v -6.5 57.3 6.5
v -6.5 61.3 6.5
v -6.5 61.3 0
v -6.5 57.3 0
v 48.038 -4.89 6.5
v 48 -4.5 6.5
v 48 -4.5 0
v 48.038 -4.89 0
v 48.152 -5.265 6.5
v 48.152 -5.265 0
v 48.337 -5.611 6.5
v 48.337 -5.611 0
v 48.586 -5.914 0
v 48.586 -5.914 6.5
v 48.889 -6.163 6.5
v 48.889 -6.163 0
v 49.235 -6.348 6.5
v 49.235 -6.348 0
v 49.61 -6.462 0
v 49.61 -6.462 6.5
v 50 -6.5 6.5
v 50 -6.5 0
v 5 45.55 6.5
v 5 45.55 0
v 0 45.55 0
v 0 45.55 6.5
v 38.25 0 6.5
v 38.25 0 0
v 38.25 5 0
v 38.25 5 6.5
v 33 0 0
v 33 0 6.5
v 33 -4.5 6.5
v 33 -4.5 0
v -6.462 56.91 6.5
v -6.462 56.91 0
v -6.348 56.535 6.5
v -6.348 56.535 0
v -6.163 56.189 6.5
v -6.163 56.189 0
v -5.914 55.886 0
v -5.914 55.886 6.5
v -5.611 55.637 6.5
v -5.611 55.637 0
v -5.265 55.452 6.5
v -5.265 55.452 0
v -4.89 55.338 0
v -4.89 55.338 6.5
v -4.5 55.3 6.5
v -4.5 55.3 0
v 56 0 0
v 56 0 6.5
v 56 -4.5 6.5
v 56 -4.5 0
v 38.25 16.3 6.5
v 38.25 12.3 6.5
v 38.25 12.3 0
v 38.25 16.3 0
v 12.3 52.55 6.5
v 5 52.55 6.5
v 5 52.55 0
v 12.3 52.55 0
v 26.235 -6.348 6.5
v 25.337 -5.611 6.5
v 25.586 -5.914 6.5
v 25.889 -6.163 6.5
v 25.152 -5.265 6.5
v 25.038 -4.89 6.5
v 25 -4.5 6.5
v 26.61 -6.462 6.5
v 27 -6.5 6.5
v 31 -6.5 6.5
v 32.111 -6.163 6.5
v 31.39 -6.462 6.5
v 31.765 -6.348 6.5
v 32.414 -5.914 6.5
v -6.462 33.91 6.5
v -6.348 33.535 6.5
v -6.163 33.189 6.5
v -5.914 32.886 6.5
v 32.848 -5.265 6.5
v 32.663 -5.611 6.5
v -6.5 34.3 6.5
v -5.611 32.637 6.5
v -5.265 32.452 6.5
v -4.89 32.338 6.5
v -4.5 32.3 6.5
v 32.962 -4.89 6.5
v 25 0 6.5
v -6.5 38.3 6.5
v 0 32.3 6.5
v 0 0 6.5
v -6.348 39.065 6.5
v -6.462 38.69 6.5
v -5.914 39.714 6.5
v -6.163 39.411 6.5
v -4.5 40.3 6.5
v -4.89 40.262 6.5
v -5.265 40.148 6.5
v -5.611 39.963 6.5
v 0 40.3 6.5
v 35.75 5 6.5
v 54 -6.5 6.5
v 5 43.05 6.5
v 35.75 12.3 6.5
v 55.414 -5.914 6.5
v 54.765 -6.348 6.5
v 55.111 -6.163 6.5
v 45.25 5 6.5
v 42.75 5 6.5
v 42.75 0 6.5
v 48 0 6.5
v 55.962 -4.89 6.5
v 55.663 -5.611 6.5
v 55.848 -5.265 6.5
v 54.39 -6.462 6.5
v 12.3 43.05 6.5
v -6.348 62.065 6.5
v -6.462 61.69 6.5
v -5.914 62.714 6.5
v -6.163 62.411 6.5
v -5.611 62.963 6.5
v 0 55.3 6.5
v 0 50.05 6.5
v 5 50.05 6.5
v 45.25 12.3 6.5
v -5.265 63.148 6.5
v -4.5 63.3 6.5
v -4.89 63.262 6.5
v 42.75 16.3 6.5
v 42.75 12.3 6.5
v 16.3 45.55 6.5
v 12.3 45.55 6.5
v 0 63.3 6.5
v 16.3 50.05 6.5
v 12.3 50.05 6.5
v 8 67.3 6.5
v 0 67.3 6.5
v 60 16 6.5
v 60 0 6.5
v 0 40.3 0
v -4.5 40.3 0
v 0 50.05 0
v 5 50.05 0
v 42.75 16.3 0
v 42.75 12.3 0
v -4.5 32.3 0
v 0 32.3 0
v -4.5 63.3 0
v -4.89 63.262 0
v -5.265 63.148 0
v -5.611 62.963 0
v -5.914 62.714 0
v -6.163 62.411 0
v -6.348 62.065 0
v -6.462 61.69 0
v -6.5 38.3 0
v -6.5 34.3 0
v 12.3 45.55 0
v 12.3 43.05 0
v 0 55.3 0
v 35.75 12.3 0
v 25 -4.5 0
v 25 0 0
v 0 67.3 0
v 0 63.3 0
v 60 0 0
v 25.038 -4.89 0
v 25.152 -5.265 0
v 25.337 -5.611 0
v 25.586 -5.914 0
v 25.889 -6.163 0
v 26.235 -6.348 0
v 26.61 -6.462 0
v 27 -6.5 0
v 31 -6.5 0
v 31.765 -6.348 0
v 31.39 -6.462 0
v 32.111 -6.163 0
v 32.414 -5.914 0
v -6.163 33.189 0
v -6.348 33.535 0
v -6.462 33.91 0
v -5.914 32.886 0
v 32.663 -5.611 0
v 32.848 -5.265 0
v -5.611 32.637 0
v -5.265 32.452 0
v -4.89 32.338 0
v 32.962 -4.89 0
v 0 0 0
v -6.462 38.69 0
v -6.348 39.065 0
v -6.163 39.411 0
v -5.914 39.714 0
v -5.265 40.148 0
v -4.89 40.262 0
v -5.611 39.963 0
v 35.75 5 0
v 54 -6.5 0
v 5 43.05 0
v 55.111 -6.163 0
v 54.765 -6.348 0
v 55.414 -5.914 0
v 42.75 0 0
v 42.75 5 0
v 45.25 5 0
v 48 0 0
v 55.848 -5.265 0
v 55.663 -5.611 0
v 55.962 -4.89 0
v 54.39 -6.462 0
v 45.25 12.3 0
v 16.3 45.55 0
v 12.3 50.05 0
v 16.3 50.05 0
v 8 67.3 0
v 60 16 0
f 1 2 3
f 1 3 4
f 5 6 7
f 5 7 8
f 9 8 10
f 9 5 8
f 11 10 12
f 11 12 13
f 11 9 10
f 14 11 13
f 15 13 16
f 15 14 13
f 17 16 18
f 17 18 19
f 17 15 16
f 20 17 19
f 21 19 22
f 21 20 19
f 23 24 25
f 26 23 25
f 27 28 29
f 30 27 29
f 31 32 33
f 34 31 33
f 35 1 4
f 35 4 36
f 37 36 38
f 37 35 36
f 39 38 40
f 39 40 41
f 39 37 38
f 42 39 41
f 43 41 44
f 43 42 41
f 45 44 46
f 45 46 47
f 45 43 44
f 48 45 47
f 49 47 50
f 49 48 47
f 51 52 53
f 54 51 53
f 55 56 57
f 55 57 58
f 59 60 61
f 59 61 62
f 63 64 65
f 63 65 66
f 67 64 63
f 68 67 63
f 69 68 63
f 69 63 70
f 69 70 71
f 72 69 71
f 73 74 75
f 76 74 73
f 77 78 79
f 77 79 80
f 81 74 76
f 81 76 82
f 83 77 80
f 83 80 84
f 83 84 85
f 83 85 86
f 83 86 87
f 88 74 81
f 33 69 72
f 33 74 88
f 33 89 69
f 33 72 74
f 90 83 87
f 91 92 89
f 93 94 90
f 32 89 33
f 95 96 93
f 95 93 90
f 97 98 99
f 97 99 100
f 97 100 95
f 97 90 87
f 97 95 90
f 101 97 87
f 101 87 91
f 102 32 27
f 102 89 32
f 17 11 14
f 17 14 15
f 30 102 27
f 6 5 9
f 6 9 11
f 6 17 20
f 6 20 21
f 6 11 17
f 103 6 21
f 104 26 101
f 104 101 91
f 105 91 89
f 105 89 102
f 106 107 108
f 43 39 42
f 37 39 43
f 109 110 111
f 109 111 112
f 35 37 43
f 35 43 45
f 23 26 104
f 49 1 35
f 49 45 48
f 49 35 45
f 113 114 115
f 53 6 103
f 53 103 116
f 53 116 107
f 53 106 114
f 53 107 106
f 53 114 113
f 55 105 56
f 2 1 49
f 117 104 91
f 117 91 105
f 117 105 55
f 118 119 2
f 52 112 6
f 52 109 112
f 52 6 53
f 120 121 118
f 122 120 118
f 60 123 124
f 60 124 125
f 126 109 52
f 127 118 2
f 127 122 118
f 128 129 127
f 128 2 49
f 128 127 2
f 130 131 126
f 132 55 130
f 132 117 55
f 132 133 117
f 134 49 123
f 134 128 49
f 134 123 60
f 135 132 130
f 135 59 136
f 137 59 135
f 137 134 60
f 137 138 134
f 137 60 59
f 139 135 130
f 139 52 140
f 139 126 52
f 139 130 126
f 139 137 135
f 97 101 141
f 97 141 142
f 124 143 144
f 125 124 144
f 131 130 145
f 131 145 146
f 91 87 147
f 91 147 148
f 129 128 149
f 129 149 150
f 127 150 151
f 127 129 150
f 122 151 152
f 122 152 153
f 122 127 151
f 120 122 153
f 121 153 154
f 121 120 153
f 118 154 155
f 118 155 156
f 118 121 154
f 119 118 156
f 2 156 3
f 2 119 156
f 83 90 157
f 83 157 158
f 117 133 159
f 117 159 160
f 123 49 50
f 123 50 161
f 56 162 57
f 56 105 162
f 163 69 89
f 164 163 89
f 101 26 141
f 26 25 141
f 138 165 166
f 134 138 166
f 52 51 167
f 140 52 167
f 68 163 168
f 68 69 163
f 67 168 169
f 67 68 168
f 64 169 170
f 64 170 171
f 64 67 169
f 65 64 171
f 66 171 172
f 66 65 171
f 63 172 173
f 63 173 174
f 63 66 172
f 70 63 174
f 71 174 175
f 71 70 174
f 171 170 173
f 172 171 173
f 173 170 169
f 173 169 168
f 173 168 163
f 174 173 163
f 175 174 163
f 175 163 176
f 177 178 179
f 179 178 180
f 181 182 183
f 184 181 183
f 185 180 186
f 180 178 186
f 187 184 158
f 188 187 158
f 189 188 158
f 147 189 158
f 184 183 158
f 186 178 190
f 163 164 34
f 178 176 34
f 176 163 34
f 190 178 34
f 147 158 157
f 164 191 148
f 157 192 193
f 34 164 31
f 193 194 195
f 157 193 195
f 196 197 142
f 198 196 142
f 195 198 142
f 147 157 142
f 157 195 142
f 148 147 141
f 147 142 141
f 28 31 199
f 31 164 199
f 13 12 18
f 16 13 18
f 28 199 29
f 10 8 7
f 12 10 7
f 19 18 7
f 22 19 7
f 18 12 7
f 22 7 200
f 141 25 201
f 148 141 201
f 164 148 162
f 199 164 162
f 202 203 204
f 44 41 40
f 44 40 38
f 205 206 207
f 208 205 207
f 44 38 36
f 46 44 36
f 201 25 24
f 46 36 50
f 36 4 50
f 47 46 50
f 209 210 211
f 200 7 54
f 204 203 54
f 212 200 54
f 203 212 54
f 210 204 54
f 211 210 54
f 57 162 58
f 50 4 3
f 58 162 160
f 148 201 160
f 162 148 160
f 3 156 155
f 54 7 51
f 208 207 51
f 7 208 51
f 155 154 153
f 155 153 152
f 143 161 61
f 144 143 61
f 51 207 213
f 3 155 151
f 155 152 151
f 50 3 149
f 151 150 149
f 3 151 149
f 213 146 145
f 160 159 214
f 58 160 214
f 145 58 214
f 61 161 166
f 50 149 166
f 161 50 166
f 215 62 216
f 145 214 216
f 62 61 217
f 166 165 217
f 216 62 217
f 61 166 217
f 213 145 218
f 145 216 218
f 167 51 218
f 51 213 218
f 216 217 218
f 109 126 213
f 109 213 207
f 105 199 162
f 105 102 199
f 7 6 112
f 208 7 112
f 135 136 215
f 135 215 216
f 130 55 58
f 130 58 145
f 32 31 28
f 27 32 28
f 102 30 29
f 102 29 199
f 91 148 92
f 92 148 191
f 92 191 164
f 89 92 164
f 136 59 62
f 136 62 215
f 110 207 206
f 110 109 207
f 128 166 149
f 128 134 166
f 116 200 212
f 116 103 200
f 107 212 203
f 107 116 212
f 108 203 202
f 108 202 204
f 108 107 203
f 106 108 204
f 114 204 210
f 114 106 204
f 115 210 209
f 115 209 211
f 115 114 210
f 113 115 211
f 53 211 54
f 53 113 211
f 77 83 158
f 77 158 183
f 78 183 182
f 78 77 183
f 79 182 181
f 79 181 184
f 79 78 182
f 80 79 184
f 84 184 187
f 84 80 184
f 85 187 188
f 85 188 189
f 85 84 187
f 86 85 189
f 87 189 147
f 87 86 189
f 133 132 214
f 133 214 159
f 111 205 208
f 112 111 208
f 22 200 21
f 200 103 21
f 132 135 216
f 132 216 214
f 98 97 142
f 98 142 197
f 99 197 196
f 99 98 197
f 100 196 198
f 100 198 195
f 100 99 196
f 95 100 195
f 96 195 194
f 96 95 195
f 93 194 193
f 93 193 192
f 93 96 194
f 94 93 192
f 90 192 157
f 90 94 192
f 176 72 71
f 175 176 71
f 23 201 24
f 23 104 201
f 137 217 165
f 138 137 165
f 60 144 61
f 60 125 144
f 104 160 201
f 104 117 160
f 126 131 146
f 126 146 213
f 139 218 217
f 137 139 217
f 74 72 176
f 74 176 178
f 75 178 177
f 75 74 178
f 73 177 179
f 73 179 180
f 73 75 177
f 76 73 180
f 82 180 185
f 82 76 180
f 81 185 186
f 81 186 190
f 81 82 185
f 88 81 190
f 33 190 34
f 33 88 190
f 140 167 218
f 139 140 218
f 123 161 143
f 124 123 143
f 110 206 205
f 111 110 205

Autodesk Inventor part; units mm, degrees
ref_plane "YZ Plane" through (0, 0, 0) normal (1, 0, 0) x (0, 1, 0)
ref_plane "XZ Plane" through (0, 0, 0) normal (0, 1, 0) x (-1, 0, 0)
ref_plane "XY Plane" through (0, 0, 0) normal (0, 0, 1) x (1, 0, 0)
sketch "Sketch1" plane through (0, 0, 0) normal (0, 0, 1) x (1, 0, 0)
  line L0 (0, 67.3) -> (0, 0)
  line L1 (0, 0) -> (60, 0)
  line L2 (60, 0) -> (60, 16)
  line L3 (60, 16) -> (8, 67.3)
  line L4 (8, 67.3) -> (0, 67.3)
  dimension "d0" = 67.3
  dimension "d1" = 8
  dimension "d2" = 16
  dimension "d3" = 60
extrude "Extrusion1" add sketch "Sketch1" along normal blind 6.5
sketch "Sketch2" plane through (0, 0, 6.5) normal (0, 0, 1) x (1, 0, 0)
  line L0 (0, 67.3) -> (0, 0) projected
  line L1 (0, 0) -> (60, 0) projected
  line L2 (60, 0) -> (60, 16) projected
  line L3 (8, 67.3) -> (0, 67.3) projected
  line L4 (16.3, 50.05) -> (16.3, 45.55)
  line L5 (0, 45.55) -> (0, 50.05)
  line L6 (5, 52.55) -> (12.3, 52.55)
  line L7 (12.3, 43.05) -> (5, 43.05)
  line L8 (38.25, 16.3) -> (42.75, 16.3)
  line L9 (42.75, 0) -> (38.25, 0)
  line L10 (45.25, 12.3) -> (45.25, 5)
  line L11 (35.75, 5) -> (35.75, 12.3)
  line L12 (5, 43.05) -> (5, 45.55)
  line L13 (5, 50.05) -> (5, 52.55)
  line L14 (12.3, 52.55) -> (12.3, 50.05)
  line L15 (12.3, 45.55) -> (12.3, 43.05)
  line L16 (0, 50.05) -> (5, 50.05)
  line L17 (12.3, 50.05) -> (16.3, 50.05)
  line L18 (16.3, 45.55) -> (12.3, 45.55)
  line L19 (5, 45.55) -> (0, 45.55)
  line L20 (35.75, 12.3) -> (38.25, 12.3)
  line L21 (42.75, 12.3) -> (45.25, 12.3)
  line L22 (45.25, 5) -> (42.75, 5)
  line L23 (38.25, 5) -> (35.75, 5)
  line L24 (38.25, 0) -> (38.25, 5)
  line L25 (38.25, 12.3) -> (38.25, 16.3)
  line L26 (42.75, 16.3) -> (42.75, 12.3)
  line L27 (42.75, 5) -> (42.75, 0)
  point P0 (16.3, 47.8)
  point P1 (40.5, 16.3)
  dimension "d6" = 4.5
  dimension "d7" = 5
  dimension "d8" = 7.3
  dimension "d9" = 4
  dimension "d10" = 2.5
  dimension "d11" = 19.5
  dimension "d12" = 19.5
extrude "Extrusion2" cut sketch "Sketch2" against normal through all
sketch "Sketch3" plane through (0, 0, 6.5) normal (0, 0, 1) x (1, 0, 0)
  line L0 (0, 45.55) -> (0, 0) projected
  line L1 (0, 0) -> (38.25, 0) projected
  line L2 (38.25, 16.3) -> (42.75, 16.3) projected
  line L3 (42.75, 0) -> (60, 0) projected
  line L4 (0, 67.3) -> (0, 50.05) projected
  line L5 (16.3, 50.05) -> (16.3, 45.55) projected
  line L6 (0, 40.3) -> (-4.5, 40.3)
  line L7 (-6.5, 38.3) -> (-6.5, 34.3)
  line L8 (-4.5, 32.3) -> (0, 32.3)
  line L9 (0, 32.3) -> (0, 40.3)
  line L10 (0, 63.3) -> (-4.5, 63.3)
  line L11 (-6.5, 61.3) -> (-6.5, 57.3)
  line L12 (-4.5, 55.3) -> (0, 55.3)
  line L13 (0, 55.3) -> (0, 63.3)
  line L14 (25, 0) -> (33, 0)
  line L15 (33, 0) -> (33, -4.5)
  line L16 (31, -6.5) -> (27, -6.5)
  line L17 (25, -4.5) -> (25, 0)
  line L18 (48, 0) -> (56, 0)
  line L19 (56, 0) -> (56, -4.5)
  line L20 (54, -6.5) -> (50, -6.5)
  line L21 (48, -4.5) -> (48, 0)
  arc A0 (-4.5, 63.3) -> (-6.5, 61.3) centre (-4.5, 61.3) ccw
  arc A1 (-6.5, 57.3) -> (-4.5, 55.3) centre (-4.5, 57.3) ccw
  arc A2 (-4.5, 40.3) -> (-6.5, 38.3) centre (-4.5, 38.3) ccw
  arc A3 (-6.5, 34.3) -> (-4.5, 32.3) centre (-4.5, 34.3) ccw
  arc A4 (25, -4.5) -> (27, -6.5) centre (27, -4.5) ccw
  arc A5 (31, -6.5) -> (33, -4.5) centre (31, -4.5) ccw
  arc A6 (48, -4.5) -> (50, -6.5) centre (50, -4.5) ccw
  arc A7 (54, -6.5) -> (56, -4.5) centre (54, -4.5) ccw
  point P0 (16.3, 47.8)
  point P1 (40.5, 16.3)
  dimension "d15" = 2
  dimension "d16" = 8
  dimension "d17" = 8
  dimension "d18" = 8
  dimension "d19" = 8
  dimension "d20" = 6.5
  dimension "d21" = 6.5
  dimension "d22" = 15
  dimension "d23" = 15
  dimension "d24" = 7.5
  dimension "d25" = 7.5
extrude "Extrusion3" add sketch "Sketch3" against normal blind 6.5
equation "\"d21\" = d20"
properties part number "y_motor_mount_brace" material "Plywood, Finish"
